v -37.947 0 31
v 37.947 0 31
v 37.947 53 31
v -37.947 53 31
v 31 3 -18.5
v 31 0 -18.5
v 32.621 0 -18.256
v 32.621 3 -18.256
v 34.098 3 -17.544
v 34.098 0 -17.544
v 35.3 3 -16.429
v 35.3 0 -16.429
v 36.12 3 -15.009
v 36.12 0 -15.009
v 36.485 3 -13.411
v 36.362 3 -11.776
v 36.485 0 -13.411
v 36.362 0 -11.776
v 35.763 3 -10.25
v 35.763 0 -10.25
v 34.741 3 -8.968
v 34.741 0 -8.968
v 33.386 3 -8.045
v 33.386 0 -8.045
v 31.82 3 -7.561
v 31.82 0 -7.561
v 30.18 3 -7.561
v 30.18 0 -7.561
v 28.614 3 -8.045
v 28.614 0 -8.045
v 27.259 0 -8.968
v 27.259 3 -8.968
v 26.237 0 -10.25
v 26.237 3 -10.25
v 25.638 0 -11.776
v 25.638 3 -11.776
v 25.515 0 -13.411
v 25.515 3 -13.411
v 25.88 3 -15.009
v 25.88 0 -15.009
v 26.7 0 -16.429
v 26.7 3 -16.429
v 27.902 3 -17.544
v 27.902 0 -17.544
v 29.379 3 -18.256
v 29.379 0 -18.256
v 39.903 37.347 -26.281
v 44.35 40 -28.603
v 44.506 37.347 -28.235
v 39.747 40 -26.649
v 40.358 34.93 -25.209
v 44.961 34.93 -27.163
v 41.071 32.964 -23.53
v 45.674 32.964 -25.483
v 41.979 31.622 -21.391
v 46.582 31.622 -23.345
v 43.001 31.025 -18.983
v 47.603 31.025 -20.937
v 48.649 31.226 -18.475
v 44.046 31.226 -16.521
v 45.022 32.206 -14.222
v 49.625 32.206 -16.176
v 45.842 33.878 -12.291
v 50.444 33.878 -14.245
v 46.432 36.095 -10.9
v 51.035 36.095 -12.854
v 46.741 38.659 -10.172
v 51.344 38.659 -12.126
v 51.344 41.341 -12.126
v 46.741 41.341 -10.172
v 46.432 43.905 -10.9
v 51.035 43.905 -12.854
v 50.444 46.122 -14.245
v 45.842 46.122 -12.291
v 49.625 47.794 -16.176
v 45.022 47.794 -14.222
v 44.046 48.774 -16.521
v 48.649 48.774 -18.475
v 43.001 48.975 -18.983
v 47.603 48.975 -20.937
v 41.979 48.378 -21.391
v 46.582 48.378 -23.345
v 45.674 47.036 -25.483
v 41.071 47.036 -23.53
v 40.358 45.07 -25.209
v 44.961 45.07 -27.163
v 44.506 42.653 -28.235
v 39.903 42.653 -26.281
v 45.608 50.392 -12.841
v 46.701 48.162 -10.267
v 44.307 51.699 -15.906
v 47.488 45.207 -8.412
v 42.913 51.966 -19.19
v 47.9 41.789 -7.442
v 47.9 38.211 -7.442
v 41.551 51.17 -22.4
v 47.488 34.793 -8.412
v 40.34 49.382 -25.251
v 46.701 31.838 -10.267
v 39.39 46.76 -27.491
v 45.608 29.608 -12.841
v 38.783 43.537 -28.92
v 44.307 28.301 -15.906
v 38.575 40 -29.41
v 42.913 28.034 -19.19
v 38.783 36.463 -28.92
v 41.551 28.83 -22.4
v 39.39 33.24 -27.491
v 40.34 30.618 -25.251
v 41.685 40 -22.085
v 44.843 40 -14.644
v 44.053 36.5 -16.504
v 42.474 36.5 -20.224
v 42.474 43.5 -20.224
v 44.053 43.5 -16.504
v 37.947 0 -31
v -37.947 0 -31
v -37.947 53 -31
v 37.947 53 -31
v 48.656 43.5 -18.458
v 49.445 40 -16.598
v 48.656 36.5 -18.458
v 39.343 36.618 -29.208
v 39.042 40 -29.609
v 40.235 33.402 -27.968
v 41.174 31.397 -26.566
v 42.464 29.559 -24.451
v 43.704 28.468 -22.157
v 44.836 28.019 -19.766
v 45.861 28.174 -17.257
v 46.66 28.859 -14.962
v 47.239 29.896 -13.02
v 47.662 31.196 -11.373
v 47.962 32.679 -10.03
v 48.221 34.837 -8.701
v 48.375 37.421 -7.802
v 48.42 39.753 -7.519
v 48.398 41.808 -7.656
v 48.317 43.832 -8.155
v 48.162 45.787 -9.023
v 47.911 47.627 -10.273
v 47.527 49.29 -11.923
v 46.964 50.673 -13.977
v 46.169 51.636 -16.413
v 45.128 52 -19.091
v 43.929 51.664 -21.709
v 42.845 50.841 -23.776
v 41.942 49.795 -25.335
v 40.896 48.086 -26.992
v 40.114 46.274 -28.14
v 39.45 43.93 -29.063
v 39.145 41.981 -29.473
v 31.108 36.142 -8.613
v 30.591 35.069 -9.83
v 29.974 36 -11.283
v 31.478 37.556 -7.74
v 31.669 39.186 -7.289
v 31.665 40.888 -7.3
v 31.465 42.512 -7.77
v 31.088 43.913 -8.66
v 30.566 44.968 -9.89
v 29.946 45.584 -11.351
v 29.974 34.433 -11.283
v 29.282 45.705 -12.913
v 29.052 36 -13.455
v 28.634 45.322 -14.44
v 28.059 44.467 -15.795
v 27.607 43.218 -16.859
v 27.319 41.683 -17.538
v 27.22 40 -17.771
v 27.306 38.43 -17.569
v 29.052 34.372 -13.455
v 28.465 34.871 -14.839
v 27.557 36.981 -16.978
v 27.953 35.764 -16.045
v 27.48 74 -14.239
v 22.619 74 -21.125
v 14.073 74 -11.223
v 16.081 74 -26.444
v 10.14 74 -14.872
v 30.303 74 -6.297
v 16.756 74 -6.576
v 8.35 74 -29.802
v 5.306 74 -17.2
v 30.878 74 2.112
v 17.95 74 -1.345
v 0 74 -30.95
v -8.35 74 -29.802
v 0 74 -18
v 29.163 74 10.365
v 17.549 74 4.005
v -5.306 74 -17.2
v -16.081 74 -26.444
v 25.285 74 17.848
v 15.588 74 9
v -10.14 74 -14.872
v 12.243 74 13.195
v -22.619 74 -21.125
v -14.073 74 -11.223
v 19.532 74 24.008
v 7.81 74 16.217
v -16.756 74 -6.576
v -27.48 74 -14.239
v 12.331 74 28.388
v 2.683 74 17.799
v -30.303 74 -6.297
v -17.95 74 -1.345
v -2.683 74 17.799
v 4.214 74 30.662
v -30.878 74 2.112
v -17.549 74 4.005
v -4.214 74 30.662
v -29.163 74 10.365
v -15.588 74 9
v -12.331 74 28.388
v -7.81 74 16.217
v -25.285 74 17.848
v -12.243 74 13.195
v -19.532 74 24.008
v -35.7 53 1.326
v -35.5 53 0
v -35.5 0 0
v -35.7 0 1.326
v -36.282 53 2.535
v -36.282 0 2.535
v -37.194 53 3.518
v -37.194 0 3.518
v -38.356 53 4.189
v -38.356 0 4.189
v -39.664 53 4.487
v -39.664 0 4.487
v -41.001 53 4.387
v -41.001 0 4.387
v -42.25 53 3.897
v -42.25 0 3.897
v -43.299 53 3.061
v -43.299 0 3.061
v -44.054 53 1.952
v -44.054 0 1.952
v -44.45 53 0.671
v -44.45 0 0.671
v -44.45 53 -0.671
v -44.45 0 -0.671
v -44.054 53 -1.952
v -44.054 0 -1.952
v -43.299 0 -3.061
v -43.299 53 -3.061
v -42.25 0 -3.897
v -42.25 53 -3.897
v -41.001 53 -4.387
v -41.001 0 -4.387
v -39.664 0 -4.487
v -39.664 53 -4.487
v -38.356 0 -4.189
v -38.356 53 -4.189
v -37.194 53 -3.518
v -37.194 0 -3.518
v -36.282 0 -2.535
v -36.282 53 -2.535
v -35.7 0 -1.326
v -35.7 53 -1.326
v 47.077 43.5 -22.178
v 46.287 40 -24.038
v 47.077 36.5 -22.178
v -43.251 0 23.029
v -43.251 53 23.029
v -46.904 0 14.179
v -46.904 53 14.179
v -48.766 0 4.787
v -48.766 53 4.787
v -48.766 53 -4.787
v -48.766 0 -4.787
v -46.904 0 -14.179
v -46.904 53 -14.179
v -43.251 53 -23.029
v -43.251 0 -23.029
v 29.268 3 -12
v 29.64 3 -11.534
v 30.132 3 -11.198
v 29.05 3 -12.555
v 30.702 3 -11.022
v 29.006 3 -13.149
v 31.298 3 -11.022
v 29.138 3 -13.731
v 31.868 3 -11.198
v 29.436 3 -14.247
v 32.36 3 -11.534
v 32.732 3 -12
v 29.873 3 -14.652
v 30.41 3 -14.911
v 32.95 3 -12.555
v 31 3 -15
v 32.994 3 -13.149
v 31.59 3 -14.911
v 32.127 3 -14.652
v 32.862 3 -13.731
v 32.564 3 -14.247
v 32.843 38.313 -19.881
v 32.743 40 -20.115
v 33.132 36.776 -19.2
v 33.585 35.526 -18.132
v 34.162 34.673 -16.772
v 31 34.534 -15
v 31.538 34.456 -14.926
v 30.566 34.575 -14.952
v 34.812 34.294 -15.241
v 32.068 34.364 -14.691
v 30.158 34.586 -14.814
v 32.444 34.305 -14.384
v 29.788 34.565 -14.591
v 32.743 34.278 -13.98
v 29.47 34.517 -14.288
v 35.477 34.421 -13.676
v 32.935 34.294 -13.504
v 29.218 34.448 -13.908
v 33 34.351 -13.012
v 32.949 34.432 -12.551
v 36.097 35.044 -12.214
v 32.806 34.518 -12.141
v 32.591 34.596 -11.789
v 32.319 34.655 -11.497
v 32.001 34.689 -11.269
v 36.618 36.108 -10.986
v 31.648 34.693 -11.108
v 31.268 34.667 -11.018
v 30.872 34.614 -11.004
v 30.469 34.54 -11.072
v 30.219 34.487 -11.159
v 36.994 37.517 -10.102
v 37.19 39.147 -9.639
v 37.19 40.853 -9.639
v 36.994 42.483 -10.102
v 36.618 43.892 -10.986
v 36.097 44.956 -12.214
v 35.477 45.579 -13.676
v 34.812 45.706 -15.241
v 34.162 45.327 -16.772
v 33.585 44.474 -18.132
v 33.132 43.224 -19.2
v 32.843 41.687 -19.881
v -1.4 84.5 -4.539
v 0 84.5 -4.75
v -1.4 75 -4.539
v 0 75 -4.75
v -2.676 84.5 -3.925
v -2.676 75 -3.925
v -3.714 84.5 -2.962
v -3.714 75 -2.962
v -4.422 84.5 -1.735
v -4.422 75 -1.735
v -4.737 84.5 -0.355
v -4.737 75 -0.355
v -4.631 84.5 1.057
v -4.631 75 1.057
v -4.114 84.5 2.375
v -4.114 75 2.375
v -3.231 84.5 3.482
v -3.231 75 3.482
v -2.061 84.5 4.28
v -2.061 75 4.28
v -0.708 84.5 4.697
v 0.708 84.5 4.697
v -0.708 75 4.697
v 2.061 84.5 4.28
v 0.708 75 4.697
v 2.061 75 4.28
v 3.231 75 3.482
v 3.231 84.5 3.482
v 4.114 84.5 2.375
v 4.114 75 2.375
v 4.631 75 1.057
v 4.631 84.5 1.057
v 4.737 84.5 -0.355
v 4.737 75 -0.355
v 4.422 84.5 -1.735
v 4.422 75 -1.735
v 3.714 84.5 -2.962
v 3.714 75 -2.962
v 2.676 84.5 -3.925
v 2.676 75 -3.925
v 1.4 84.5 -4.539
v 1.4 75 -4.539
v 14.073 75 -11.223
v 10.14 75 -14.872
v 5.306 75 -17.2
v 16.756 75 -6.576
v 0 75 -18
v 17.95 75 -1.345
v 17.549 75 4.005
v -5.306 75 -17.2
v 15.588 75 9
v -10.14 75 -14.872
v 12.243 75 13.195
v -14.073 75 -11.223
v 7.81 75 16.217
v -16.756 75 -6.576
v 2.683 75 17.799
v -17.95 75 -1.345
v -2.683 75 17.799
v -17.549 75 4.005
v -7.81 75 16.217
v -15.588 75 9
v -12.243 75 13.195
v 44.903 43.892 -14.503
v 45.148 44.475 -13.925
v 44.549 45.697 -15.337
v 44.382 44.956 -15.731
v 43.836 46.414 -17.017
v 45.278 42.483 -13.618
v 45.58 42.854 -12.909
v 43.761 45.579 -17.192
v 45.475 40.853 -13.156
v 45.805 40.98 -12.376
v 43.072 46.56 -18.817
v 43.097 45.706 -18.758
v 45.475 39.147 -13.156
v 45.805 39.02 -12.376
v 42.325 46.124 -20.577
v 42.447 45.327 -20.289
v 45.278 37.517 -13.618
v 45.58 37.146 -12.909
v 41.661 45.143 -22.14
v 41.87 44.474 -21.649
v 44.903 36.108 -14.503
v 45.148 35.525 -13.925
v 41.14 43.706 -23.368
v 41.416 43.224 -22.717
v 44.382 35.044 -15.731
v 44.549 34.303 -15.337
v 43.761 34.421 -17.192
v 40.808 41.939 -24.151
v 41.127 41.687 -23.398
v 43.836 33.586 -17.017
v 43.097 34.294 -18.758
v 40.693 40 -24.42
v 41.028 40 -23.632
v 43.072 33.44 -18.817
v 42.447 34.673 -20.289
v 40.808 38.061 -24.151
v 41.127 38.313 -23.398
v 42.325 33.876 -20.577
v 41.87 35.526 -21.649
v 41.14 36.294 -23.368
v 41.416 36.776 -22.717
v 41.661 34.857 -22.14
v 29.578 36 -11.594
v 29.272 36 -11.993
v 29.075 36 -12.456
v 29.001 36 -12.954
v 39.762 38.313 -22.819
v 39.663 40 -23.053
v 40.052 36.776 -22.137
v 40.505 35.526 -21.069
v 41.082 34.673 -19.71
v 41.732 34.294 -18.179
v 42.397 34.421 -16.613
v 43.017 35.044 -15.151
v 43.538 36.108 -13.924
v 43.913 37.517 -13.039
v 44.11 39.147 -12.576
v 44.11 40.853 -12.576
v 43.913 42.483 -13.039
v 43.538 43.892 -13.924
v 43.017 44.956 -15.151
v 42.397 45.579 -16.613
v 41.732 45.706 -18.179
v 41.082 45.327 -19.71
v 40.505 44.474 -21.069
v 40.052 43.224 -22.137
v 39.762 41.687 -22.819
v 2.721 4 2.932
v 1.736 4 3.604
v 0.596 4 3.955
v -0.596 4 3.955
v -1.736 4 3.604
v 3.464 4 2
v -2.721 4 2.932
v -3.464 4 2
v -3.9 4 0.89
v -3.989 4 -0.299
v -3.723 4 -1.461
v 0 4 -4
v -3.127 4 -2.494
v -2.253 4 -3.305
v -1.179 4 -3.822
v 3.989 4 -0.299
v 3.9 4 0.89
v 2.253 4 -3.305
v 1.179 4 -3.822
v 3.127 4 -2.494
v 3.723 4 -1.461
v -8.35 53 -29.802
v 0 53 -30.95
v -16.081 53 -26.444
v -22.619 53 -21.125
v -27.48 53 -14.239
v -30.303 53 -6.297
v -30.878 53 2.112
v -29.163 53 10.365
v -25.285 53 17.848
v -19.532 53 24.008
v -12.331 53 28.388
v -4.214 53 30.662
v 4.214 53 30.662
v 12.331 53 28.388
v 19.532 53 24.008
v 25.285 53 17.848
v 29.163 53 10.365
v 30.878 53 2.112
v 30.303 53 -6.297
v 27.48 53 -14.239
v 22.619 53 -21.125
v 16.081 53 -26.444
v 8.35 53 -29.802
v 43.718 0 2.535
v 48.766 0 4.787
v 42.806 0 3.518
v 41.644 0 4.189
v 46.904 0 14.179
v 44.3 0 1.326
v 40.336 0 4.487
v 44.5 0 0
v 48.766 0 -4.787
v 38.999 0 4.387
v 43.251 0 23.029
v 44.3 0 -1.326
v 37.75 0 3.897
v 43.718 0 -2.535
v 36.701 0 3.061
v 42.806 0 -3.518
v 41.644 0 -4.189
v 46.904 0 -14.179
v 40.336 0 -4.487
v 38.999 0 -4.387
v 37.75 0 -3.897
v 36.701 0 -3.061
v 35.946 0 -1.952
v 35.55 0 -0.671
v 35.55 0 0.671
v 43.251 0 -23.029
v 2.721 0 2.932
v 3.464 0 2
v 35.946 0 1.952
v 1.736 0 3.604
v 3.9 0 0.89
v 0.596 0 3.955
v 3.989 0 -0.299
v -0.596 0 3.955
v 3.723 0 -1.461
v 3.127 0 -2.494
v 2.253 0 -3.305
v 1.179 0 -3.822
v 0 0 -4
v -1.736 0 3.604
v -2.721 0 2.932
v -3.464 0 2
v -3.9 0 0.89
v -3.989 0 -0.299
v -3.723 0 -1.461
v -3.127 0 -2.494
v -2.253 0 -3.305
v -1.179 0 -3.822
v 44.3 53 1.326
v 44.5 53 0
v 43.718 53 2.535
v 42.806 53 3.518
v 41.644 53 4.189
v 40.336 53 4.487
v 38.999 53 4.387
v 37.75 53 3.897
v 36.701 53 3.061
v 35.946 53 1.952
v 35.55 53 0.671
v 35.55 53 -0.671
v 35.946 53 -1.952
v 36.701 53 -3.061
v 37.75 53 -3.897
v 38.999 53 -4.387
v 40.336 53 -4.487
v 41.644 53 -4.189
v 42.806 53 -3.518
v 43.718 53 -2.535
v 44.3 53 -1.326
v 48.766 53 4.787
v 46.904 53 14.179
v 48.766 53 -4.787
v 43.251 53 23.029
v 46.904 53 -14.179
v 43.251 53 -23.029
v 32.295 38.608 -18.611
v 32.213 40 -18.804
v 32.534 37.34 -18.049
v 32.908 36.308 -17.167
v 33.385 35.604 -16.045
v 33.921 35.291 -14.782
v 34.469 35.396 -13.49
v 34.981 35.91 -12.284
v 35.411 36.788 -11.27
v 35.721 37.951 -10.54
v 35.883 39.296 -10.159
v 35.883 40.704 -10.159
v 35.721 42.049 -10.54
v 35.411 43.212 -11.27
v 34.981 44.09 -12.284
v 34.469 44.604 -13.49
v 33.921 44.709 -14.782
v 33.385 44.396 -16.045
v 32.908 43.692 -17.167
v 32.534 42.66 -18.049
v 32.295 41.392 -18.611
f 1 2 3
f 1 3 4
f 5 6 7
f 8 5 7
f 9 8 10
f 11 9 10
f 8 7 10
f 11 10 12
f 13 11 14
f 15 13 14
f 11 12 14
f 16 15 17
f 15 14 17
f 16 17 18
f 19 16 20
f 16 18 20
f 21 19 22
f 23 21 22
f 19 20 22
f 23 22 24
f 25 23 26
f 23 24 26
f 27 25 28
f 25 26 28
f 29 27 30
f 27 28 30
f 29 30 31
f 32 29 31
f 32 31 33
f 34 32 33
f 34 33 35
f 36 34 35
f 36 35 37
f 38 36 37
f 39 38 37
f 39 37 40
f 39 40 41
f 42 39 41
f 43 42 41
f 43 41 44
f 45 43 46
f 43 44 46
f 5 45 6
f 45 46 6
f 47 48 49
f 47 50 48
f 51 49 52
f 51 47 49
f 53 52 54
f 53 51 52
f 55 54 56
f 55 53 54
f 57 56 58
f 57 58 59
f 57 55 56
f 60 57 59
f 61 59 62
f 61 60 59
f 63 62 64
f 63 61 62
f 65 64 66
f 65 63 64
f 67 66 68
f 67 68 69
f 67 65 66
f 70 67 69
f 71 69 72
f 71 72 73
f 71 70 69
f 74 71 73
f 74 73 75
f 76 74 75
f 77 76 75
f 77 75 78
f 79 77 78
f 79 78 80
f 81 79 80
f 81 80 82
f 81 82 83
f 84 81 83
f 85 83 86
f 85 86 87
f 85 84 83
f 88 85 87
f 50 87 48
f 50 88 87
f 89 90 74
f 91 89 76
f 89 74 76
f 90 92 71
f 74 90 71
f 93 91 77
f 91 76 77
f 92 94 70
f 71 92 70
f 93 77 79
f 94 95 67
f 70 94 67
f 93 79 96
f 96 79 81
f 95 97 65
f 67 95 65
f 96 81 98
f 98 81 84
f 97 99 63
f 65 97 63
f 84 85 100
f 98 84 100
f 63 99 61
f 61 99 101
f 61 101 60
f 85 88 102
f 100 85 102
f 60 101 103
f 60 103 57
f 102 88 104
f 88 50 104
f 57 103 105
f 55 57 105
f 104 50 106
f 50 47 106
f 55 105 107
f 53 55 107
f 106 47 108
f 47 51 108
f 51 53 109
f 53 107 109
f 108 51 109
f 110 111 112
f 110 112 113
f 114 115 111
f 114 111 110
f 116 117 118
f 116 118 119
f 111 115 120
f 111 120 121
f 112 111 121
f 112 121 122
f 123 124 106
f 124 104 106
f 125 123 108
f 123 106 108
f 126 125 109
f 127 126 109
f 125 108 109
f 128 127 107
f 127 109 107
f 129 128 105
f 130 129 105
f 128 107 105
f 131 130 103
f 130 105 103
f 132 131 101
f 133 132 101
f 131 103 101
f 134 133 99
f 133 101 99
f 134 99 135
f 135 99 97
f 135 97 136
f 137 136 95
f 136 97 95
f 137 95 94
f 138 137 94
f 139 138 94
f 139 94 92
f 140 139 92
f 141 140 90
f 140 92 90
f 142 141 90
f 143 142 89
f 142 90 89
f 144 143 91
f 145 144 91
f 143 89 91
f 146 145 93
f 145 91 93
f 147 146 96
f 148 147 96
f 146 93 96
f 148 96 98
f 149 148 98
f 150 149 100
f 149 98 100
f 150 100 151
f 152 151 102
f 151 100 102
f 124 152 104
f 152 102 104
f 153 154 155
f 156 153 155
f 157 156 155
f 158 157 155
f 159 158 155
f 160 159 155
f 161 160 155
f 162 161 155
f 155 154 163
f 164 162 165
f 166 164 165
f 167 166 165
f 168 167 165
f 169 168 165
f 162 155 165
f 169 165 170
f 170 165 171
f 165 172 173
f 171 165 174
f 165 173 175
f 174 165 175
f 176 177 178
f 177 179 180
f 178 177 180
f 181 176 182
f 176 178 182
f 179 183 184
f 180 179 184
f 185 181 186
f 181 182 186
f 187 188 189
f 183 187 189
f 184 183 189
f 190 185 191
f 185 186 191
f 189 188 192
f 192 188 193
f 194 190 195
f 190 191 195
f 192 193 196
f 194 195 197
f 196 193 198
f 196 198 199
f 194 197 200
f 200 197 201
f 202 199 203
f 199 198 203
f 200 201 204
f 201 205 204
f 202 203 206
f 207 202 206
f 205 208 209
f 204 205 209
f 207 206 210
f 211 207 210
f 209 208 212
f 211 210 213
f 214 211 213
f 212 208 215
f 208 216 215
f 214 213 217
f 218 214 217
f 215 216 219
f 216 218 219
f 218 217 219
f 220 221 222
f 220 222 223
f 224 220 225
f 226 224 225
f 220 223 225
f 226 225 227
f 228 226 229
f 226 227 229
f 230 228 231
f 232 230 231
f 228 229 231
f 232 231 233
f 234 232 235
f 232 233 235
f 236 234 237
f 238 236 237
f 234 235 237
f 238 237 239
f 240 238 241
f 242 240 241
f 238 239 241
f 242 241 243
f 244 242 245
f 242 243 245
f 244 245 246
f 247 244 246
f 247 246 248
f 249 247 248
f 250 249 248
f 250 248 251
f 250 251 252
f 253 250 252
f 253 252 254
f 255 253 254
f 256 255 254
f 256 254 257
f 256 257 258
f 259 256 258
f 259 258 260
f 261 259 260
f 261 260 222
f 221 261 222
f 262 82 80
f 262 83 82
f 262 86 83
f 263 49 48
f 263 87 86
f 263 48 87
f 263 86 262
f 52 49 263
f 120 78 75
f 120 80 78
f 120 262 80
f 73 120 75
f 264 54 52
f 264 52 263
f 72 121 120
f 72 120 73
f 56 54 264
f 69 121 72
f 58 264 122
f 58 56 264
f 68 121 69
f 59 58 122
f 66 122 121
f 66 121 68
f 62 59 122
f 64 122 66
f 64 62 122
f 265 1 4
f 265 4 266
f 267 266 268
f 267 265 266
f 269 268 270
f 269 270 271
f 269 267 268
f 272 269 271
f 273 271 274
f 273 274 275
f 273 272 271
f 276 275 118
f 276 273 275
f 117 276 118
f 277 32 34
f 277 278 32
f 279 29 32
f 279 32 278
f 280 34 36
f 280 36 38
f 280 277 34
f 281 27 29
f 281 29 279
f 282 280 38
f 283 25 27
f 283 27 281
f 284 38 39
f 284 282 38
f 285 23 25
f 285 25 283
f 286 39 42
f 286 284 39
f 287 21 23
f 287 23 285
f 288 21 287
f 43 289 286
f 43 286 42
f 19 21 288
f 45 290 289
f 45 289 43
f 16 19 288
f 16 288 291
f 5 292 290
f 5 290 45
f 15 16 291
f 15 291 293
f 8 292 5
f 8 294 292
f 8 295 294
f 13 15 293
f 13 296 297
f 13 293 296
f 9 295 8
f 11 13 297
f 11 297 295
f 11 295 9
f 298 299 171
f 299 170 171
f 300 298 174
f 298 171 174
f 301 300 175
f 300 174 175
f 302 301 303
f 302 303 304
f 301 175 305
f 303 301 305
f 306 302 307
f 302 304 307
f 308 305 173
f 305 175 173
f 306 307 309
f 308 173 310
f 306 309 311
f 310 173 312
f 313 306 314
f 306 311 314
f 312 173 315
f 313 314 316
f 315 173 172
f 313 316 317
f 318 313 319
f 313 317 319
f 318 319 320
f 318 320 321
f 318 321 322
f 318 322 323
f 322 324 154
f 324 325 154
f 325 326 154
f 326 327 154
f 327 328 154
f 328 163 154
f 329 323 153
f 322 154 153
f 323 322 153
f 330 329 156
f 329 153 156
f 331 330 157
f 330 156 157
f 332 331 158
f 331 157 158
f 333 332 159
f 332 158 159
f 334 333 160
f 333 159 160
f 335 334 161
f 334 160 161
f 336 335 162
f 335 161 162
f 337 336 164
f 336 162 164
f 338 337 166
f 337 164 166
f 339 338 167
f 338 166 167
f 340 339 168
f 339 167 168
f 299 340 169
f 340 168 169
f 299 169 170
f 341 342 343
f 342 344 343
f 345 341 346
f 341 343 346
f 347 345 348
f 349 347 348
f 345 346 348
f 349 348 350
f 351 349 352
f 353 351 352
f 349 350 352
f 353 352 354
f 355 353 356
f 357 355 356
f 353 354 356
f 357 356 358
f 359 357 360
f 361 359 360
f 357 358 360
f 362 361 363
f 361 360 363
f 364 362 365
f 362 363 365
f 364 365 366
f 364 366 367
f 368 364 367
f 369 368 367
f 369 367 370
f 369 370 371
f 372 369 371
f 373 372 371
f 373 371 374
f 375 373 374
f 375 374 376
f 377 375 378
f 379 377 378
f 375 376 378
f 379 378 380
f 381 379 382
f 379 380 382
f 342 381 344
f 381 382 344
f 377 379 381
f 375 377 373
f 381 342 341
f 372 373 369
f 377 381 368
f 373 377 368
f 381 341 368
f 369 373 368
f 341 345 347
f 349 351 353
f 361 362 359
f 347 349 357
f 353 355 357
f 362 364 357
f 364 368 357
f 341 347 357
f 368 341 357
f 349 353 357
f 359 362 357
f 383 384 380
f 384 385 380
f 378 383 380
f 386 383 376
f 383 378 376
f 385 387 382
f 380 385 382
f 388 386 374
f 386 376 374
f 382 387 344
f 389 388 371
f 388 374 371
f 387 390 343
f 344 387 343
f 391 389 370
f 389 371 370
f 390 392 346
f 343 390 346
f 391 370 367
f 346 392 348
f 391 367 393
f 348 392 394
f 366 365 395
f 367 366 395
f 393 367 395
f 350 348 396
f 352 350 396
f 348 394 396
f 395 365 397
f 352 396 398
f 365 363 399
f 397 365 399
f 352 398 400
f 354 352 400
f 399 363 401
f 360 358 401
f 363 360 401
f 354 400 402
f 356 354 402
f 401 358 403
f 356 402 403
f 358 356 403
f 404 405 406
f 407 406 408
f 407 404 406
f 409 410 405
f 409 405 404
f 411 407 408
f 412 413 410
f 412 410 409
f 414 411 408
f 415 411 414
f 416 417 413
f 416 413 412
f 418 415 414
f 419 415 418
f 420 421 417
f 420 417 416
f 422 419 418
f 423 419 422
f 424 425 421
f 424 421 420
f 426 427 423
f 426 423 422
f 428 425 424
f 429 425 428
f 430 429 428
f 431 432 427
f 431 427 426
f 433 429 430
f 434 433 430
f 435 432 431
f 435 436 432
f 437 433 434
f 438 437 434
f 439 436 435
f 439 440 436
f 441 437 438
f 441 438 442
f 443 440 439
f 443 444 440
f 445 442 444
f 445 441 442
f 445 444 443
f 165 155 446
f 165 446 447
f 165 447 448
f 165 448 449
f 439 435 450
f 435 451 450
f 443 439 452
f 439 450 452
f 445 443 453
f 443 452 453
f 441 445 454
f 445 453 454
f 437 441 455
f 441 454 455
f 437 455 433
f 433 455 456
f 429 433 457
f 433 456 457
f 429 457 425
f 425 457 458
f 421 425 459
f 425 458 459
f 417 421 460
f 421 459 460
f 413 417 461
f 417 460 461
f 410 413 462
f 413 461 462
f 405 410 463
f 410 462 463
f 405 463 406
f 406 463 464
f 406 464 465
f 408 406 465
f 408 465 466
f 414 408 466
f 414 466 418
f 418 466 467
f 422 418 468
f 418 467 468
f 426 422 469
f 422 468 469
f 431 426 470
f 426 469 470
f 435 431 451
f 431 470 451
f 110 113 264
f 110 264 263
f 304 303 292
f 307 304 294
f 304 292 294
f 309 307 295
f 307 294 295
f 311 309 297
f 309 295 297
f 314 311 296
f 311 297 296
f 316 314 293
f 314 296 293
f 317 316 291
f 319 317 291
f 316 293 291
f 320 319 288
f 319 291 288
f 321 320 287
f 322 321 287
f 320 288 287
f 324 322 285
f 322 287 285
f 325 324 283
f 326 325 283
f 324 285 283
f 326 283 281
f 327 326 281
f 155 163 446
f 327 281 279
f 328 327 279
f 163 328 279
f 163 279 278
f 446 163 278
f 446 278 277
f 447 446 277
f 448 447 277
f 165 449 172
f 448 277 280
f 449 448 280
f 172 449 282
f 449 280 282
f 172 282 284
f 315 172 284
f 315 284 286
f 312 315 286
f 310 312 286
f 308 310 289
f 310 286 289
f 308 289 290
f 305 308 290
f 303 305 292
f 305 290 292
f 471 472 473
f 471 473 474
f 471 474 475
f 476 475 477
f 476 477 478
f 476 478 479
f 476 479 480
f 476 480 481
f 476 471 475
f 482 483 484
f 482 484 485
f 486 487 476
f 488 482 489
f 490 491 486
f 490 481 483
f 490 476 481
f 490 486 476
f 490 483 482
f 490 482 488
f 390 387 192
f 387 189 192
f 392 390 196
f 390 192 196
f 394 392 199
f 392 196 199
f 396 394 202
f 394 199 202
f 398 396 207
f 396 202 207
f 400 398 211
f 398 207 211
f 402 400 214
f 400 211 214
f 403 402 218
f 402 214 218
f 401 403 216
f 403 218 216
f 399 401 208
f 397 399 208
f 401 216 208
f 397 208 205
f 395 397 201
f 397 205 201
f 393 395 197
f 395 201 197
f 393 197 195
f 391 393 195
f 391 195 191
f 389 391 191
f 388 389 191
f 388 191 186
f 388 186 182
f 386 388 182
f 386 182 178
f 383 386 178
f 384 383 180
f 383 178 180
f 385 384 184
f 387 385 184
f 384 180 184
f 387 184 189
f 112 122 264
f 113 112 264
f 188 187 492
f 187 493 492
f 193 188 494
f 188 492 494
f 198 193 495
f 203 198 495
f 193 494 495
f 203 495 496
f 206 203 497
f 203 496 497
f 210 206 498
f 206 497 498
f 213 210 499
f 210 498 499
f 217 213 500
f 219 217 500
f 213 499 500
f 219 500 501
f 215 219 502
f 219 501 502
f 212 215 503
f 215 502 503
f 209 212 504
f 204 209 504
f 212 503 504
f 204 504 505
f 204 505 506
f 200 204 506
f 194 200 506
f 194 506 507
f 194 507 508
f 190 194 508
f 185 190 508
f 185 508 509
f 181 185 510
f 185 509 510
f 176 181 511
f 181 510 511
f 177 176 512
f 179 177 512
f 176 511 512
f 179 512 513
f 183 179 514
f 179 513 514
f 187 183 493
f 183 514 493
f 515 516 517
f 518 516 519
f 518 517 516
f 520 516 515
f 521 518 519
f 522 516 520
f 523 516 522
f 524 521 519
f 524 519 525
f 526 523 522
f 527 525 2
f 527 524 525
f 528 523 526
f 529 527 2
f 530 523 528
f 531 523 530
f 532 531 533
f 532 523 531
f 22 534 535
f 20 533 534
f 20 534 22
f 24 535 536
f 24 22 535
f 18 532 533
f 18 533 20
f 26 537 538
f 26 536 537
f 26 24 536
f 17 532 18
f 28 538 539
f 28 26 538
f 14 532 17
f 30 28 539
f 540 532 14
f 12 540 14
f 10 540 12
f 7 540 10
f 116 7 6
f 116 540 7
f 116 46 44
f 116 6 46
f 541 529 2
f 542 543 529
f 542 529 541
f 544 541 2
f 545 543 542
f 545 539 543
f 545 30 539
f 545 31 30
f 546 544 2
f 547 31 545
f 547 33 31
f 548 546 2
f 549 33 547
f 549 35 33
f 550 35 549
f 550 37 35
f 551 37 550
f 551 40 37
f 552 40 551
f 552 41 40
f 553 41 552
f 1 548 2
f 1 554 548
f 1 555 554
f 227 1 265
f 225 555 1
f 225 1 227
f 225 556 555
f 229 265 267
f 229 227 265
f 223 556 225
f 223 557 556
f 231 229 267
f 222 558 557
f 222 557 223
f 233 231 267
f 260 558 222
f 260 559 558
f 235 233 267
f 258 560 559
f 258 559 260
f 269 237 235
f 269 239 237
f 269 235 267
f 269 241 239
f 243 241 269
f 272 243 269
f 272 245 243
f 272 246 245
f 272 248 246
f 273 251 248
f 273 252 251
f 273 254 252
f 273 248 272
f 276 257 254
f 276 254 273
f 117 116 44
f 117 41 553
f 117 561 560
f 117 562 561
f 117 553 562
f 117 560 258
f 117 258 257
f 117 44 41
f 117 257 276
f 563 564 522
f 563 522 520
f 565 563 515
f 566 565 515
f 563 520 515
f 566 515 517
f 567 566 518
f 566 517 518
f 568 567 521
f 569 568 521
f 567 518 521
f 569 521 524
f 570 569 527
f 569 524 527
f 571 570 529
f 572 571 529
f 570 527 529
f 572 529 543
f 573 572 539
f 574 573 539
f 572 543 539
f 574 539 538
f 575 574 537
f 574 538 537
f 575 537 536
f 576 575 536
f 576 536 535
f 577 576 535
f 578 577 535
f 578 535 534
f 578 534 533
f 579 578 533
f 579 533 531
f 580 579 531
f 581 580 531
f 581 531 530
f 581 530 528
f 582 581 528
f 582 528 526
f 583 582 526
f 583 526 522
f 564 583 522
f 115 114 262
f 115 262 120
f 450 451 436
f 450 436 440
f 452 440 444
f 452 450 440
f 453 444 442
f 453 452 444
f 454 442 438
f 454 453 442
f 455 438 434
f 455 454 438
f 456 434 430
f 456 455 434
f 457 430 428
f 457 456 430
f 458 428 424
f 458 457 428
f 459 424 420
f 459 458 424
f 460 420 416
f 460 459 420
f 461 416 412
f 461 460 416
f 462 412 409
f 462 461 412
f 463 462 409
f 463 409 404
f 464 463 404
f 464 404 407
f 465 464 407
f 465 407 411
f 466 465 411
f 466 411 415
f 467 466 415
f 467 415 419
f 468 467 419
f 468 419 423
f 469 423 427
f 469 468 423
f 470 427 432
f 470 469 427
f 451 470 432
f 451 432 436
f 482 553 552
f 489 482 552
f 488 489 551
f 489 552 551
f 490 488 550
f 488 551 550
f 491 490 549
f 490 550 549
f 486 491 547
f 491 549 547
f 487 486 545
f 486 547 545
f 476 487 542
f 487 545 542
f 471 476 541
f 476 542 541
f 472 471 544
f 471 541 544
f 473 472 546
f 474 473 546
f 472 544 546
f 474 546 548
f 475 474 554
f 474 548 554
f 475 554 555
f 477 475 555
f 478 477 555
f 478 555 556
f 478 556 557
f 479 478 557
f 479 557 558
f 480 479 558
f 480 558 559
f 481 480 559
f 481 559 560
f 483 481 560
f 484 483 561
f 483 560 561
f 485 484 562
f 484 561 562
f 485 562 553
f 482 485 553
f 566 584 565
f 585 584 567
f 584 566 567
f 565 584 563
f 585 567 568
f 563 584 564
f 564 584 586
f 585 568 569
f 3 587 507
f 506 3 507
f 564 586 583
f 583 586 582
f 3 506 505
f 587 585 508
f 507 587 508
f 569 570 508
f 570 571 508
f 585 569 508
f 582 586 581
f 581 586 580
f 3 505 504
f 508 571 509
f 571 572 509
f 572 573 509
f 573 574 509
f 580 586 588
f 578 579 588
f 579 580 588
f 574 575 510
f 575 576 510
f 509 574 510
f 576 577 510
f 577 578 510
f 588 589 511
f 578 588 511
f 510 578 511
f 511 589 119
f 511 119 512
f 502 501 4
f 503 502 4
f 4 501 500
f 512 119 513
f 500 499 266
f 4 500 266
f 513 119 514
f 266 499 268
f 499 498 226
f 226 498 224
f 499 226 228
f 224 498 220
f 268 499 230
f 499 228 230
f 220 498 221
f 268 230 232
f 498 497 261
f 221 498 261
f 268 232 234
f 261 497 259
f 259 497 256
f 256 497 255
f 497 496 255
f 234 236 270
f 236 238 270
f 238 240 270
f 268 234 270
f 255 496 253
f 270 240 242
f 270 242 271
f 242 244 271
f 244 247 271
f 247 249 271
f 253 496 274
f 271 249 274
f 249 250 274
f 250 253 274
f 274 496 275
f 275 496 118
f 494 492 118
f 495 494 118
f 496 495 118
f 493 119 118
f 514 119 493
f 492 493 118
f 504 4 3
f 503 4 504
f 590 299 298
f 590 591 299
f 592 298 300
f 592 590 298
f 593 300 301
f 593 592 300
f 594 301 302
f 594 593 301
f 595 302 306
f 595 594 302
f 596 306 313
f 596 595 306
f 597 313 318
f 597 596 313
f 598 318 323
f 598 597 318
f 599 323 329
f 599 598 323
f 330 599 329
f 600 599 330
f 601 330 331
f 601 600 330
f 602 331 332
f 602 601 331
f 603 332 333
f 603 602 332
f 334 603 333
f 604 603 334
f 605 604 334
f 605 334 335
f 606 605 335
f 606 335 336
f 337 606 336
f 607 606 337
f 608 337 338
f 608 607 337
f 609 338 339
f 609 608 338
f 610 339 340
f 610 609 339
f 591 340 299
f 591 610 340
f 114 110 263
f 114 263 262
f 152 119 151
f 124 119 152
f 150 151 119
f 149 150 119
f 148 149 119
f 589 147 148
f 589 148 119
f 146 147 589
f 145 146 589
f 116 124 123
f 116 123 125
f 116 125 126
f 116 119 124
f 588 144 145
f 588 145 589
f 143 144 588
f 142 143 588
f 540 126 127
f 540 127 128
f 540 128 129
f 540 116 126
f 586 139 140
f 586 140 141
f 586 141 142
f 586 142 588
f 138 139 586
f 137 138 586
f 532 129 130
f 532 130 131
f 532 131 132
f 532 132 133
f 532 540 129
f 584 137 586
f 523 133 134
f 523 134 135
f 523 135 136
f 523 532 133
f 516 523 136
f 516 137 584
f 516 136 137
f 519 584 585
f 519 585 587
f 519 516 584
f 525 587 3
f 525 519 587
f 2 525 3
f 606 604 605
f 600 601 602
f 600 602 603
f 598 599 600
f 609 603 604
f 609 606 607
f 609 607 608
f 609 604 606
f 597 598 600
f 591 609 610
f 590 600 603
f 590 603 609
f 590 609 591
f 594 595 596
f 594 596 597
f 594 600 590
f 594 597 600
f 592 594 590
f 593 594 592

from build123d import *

# Parameters (mm, degrees)
EXTRUDE1_DEPTH     = 53
HOLE1_D            = 9
HOLE1_DEPTH        = 53
SKETCH5_R          = 4
CUT_EXTRUDE1_DEPTH = 4
SKETCH6_R          = 5.5
CUT_EXTRUDE2_DEPTH = 3
SKETCH7_R          = 2
CUT_EXTRUDE3_DEPTH = 33
CUT_EXTRUDE4_DEPTH = 5


with BuildPart() as part:
    # Sketch1 → Extrude1 (new body)
    with BuildSketch(Plane(origin=(0, 0, 0), x_dir=(1, 0, 0), z_dir=(0, 1, 0))):
        with BuildLine():
            Line((-37.947331922, 31), (37.947331922, 31))
            ThreePointArc((37.947331922, 31), (49, 0), (37.947331922, -31))
            Line((37.947331922, -31), (-37.947331922, -31))
            ThreePointArc((-37.947331922, -31), (-49, 0), (-37.947331922, 31))
        make_face()
    extrude(amount=EXTRUDE1_DEPTH)

    # Sketch2 → Revolve1 (revolve)
    with BuildSketch(Plane.XY, mode=Mode.PRIVATE) as revolve1_sk:
        Polygon((0, 84.5), (-4.75, 84.5), (-4.75, 75), (-18, 75), (-18, 74), (-30.95, 74), (-30.95, 53), (0, 53), align=None)
    revolve(revolve1_sk.sketch.rotate(Axis((0, 0, 0), (0, 1, 0)), 270), axis=Axis((0, 0, 0), (0, 1, 0)))  # turned: the seam where the file's is

    # Hole1
    with Locations(Plane(origin=(0, 53, 0), x_dir=(-1, 0, 0), z_dir=(0, 1, 0))):
        with Locations((40, 0), (-40, 0)):
            Hole(HOLE1_D / 2, depth=HOLE1_DEPTH)

    # Sketch5 → Cut-Extrude1 (cut)
    with BuildSketch(Plane.XZ):
        with Locations(Location((0, 0, 0), (0, 0, 270))):  # turned: the seam where the file's is
            Circle(SKETCH5_R)
    extrude(amount=-CUT_EXTRUDE1_DEPTH, mode=Mode.SUBTRACT)

    # Sketch6 → Cut-Extrude2 (cut)
    with BuildSketch(Plane.XZ):
        with Locations(Location((31, -13, 0), (0, 0, 270))):  # turned: the seam where the file's is
            Circle(SKETCH6_R)
    extrude(amount=-CUT_EXTRUDE2_DEPTH, mode=Mode.SUBTRACT)

    # Sketch7 → Cut-Extrude3 (cut)
    with BuildSketch(Plane.XZ.offset(-3)):
        with Locations(Location((31, -13, 0), (0, 0, 270))):  # turned: the seam where the file's is
            Circle(SKETCH7_R)
    extrude(amount=-CUT_EXTRUDE3_DEPTH, mode=Mode.SUBTRACT)

    # Sketch8 → Cut-Revolve1 (revolve, cut)
    with BuildSketch(Plane(origin=(0, 0, 0), x_dir=(0.920504853, 0, -0.390731128), z_dir=(0.390731128, 0, 0.920504853)), mode=Mode.PRIVATE) as cut_revolve1_sk:
        Polygon((49, 28), (47, 28), (47, 33.4215), (45.517364509, 34.2775), (32, 34.2775), (32, 40), (49, 40), align=None)
    revolve(cut_revolve1_sk.sketch.rotate(Axis((47.484793311, 40, -20.156098913), (-0.920504853, 0, 0.390731128)), 270), axis=Axis((47.484793311, 40, -20.156098913), (-0.920504853, 0, 0.390731128)), mode=Mode.SUBTRACT)  # turned: the seam where the file's is

    # Sketch9 → Revolve2 (revolve)
    with BuildSketch(Plane(origin=(0, 0, 0), x_dir=(0.920504853, 0, -0.390731128), z_dir=(0.390731128, 0, 0.920504853)), mode=Mode.PRIVATE) as revolve2_sk:
        Polygon((47, 31), (47, 34.2775), (38, 34.2775), (37, 35.2775), (37, 40), (52, 40), (52, 31), align=None)
    revolve(revolve2_sk.sketch.rotate(Axis((53.930450878, 40, -22.892118224), (-0.920504853, 0, 0.390731128)), 270), axis=Axis((53.930450878, 40, -22.892118224), (-0.920504853, 0, 0.390731128)))  # turned: the seam where the file's is

    # Sketch10 → Cut-Extrude4 (cut)
    with BuildSketch(Plane(origin=(47.86625238, 0, -20.318018681), x_dir=(-0.390731128, 0, -0.920504853), z_dir=(0.920504853, 0, -0.390731128))):
        Polygon((4.041451884, 40), (2.020725942, 43.5), (-2.020725942, 43.5), (-4.041451884, 40), (-2.020725942, 36.5), (2.020725942, 36.5), align=None)
    extrude(amount=-CUT_EXTRUDE4_DEPTH, mode=Mode.SUBTRACT)


solid = part.part
